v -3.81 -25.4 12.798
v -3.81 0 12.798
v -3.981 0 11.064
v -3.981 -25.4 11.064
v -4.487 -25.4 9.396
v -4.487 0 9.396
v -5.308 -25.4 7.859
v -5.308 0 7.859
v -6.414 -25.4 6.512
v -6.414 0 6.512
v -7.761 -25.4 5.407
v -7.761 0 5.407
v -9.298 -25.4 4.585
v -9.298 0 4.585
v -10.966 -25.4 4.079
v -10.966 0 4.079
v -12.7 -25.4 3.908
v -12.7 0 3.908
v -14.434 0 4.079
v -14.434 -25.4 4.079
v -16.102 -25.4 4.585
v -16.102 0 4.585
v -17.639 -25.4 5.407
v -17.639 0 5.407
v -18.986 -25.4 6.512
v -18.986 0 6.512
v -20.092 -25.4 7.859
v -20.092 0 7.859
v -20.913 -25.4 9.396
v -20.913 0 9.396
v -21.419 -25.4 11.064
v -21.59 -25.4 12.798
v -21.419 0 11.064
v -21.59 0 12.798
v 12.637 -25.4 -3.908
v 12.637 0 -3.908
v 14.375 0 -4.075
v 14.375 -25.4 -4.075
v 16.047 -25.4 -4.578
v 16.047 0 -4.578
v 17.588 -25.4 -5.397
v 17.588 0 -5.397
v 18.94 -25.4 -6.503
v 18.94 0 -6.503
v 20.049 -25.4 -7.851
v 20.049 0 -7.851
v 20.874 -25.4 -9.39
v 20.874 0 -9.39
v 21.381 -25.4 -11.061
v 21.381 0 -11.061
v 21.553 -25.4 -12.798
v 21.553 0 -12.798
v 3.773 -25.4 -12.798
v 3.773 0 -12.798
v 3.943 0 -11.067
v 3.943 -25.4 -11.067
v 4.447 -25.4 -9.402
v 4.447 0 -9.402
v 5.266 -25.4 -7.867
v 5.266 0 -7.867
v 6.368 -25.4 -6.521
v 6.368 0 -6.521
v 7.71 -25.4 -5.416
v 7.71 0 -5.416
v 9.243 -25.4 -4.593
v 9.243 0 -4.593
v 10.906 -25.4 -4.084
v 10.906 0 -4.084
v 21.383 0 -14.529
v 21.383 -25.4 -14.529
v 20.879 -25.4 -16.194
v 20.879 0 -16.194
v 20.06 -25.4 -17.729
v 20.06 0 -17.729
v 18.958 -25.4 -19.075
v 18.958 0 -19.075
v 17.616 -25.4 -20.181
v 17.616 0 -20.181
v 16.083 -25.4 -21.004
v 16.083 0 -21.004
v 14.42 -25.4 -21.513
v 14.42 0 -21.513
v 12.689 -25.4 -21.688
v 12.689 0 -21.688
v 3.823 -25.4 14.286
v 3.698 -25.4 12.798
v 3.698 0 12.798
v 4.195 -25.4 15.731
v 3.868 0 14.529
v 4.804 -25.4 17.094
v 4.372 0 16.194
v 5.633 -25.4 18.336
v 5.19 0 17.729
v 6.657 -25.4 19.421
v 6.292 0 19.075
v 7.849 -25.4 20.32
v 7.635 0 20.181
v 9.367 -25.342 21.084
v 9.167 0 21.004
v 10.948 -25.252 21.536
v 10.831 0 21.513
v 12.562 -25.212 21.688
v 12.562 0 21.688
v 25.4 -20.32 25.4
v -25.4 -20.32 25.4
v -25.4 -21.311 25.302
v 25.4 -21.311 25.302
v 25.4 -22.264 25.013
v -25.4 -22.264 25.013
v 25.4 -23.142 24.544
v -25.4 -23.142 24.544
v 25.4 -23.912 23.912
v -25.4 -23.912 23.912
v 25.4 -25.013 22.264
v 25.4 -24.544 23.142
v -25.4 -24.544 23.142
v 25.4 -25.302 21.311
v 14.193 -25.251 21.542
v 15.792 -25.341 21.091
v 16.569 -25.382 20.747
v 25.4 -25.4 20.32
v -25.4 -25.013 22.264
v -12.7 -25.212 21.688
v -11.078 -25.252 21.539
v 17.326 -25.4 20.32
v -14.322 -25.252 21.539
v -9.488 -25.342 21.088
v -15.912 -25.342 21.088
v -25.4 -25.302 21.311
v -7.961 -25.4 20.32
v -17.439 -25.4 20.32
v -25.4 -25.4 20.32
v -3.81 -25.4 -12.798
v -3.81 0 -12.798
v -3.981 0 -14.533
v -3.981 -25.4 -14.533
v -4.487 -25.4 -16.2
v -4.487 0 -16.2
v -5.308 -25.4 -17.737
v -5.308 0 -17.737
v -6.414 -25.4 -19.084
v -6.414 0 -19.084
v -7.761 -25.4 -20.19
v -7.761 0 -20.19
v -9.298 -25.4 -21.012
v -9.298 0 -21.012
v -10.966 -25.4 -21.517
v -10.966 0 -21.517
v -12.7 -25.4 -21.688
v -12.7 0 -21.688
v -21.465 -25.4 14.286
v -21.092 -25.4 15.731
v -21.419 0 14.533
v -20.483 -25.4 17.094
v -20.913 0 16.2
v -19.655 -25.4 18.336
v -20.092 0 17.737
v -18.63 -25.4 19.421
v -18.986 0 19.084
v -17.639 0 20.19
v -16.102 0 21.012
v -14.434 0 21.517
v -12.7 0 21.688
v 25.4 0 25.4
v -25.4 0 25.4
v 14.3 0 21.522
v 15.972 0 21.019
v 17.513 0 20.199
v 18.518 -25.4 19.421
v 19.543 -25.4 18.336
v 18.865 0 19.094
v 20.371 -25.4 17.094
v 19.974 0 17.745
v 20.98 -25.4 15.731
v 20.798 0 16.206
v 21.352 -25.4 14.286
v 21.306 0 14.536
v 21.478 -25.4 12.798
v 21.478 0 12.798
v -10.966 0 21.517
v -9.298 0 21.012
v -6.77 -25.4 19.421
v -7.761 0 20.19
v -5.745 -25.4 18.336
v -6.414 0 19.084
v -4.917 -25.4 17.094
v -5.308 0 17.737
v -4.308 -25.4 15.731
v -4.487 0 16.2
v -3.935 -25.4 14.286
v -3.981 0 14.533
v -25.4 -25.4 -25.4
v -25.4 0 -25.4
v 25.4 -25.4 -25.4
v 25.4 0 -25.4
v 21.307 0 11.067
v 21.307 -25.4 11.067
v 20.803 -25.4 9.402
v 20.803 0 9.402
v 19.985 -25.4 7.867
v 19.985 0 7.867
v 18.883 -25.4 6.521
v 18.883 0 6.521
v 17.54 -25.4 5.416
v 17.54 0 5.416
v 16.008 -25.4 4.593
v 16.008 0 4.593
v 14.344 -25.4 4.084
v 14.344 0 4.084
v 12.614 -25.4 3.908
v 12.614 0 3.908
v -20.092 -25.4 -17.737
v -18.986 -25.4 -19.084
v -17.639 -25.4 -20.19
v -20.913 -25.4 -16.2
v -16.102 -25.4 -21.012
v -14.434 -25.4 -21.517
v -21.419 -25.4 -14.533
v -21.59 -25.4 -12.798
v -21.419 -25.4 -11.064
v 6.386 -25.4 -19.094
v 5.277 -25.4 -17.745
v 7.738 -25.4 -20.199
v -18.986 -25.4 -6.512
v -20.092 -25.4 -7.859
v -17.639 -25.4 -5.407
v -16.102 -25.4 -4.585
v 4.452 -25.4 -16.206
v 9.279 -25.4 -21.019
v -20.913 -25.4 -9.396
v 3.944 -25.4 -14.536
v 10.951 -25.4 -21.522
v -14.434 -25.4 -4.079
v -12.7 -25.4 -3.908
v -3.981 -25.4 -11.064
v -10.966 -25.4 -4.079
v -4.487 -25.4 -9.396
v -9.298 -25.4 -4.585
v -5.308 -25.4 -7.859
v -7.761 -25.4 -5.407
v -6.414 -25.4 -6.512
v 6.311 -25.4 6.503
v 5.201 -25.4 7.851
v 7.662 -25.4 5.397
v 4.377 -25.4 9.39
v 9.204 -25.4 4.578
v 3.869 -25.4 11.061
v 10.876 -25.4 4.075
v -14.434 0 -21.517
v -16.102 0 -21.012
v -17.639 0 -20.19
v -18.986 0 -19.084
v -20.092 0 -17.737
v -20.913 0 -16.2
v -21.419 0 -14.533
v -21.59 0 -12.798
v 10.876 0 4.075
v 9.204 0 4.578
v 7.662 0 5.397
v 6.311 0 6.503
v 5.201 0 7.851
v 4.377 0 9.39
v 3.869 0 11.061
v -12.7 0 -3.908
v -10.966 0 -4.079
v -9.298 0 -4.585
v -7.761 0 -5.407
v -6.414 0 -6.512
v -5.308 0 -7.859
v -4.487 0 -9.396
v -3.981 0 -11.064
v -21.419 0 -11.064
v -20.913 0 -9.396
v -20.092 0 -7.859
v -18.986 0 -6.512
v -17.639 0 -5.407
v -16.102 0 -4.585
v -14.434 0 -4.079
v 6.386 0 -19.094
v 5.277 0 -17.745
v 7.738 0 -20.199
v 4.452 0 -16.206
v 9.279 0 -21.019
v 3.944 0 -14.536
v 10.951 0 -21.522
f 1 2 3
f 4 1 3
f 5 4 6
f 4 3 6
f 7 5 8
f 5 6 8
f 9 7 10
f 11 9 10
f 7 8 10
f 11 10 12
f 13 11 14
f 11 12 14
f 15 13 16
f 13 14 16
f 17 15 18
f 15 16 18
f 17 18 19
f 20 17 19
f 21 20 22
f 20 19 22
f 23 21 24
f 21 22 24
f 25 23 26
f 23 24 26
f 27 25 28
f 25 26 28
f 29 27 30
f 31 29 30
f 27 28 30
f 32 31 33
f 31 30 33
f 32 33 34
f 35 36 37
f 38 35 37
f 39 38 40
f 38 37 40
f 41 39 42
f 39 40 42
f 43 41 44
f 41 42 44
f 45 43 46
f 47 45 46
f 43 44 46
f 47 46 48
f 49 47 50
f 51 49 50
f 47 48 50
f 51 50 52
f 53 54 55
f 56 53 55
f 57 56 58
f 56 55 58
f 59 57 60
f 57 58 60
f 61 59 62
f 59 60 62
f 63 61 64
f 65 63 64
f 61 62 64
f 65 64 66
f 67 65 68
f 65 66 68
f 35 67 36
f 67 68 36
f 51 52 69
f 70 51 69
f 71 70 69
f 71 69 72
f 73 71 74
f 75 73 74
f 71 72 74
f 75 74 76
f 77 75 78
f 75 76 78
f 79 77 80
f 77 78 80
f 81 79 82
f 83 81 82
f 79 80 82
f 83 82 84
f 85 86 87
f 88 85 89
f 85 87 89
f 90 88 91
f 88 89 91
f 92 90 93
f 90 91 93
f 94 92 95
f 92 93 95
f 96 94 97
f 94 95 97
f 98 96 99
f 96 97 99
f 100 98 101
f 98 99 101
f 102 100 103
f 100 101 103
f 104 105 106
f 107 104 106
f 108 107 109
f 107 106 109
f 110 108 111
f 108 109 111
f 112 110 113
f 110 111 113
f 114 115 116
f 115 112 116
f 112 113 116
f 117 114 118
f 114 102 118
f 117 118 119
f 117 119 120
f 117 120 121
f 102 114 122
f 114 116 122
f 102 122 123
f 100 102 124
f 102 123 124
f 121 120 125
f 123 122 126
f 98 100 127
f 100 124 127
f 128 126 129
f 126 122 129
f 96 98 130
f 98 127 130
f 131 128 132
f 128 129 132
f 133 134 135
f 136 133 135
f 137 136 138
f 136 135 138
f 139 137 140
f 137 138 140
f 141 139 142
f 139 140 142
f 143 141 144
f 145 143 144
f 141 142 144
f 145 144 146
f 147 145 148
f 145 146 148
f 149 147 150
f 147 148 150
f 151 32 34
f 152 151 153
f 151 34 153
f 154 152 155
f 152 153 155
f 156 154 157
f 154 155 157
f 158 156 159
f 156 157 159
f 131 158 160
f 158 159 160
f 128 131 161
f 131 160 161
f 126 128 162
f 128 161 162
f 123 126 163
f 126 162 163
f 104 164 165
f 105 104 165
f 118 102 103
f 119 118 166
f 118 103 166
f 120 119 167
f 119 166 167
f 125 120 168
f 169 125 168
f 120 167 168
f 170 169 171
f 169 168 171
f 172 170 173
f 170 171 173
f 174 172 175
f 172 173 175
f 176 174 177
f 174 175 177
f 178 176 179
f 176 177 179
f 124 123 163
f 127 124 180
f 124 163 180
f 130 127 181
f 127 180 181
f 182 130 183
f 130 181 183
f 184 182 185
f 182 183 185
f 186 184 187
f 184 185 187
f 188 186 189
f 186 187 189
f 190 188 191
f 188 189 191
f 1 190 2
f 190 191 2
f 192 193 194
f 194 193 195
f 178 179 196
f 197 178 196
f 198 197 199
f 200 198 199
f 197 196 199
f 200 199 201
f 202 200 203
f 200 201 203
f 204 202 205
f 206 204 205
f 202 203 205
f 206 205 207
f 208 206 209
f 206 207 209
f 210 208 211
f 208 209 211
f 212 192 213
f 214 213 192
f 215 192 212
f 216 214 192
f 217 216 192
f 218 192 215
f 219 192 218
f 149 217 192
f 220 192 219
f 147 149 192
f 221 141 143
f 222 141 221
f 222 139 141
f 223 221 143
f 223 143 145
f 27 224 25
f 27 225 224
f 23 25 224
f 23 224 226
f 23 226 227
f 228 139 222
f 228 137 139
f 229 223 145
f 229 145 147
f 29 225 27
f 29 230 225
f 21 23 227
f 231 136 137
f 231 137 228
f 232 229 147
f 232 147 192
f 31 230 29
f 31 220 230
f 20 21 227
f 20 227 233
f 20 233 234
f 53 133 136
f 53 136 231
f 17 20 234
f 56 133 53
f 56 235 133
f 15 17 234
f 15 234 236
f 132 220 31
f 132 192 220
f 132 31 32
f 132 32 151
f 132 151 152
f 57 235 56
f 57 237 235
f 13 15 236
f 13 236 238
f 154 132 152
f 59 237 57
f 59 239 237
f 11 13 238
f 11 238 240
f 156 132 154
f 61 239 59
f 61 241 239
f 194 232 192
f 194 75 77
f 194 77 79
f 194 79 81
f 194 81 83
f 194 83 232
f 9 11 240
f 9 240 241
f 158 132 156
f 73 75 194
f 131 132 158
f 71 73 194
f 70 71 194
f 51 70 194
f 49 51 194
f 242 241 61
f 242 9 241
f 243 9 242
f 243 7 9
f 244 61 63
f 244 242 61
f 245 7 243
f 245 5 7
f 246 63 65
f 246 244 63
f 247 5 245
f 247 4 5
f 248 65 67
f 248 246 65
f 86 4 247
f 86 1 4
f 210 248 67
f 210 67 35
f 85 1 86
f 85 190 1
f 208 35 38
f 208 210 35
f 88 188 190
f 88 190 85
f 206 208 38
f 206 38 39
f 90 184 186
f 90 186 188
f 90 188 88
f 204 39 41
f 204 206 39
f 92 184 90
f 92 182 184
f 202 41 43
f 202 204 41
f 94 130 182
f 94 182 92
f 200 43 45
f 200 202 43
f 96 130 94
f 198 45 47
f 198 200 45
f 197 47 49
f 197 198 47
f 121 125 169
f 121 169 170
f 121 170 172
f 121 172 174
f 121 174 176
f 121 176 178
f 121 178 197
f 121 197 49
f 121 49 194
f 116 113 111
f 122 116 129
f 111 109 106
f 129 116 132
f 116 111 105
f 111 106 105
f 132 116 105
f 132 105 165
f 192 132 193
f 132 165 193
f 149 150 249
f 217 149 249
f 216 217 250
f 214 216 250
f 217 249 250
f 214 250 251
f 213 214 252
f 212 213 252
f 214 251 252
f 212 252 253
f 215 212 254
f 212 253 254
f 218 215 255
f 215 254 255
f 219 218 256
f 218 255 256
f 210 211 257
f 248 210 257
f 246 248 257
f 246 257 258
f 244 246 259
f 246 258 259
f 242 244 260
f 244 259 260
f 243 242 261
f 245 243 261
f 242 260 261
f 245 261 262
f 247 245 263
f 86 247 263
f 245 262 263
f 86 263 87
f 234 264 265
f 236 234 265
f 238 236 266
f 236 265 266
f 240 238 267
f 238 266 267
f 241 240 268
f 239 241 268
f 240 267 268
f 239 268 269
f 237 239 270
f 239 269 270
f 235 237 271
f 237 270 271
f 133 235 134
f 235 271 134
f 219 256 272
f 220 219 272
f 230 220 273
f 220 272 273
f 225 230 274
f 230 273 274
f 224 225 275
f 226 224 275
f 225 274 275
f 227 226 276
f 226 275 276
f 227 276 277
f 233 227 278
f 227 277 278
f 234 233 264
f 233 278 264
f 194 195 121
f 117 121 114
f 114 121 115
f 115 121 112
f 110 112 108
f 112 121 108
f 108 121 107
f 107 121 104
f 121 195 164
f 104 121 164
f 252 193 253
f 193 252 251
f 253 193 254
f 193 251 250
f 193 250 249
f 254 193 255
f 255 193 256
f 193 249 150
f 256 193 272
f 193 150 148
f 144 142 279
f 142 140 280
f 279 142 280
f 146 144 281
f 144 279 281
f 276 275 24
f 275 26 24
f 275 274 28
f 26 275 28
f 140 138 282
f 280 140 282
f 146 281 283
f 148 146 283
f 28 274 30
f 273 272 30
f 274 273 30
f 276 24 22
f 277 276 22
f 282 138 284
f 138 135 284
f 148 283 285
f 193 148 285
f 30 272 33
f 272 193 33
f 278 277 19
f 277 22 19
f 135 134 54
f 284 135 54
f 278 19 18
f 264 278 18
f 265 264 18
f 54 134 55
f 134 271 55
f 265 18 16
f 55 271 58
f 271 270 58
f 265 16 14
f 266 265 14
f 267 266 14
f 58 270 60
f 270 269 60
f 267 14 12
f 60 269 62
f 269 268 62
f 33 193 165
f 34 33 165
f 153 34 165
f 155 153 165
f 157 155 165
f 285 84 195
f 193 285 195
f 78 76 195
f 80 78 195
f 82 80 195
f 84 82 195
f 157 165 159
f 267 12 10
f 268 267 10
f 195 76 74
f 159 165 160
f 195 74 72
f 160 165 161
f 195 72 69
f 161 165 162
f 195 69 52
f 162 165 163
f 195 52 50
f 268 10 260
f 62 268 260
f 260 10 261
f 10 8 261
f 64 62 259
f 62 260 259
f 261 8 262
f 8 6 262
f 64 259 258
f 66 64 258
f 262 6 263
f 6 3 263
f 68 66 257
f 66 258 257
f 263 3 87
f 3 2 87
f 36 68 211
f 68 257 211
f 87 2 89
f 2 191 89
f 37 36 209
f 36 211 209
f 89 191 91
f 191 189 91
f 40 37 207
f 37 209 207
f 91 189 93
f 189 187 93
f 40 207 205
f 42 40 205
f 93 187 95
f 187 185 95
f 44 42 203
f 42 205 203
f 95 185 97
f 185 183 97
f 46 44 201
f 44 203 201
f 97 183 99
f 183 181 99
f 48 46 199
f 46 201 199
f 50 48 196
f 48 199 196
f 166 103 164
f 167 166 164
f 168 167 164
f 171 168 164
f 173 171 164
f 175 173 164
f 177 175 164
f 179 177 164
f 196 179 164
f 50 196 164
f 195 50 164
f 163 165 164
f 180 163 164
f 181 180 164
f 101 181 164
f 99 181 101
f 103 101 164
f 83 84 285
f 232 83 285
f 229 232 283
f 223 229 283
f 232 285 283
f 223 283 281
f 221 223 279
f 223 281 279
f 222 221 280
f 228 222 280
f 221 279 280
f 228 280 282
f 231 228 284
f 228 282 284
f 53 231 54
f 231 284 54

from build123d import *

# Parameters (mm, degrees)
F1_DEPTH    = 25.4
F2_T1_DEPTH = 76.2


# Not quite as in the source:
# - a fillet or chamfer that OpenCascade refuses, or shapes differently, is made with other operations: its cross-section is extruded or revolved along the edge and cut away or added


with BuildPart() as f1:
    # F0 (on Front) → F1 (new body)
    with BuildSketch(Plane.XZ):
        with BuildLine():
            Line((-12.7, 25.4), (-25.4, 25.4))
            Line((-25.4, 25.4), (-25.4, 12.798297219))
            Line((-25.4, 12.798297219), (-21.59, 12.798297219))
            ThreePointArc((-21.59, 12.798297219), (-18.9861792847, 19.0844765037), (-12.7, 21.688297219))
            Line((-12.7, 21.688297219), (-12.7, 25.4))
        make_face()
        with BuildLine():
            Line((0, 25.4), (-12.7, 25.4))
            Line((-12.7, 25.4), (-12.7, 21.688297219))
            ThreePointArc((-12.7, 21.688297219), (-6.4138207153, 19.0844765037), (-3.81, 12.798297219))
            Line((-3.81, 12.798297219), (0, 12.798297219))
            Line((0, 12.798297219), (0, 25.4))
        make_face()
        with BuildLine():
            Line((-21.59, 12.798297219), (-25.4, 12.798297219))
            Line((-25.4, 12.798297219), (-25.4, 0))
            Line((-25.4, 0), (-12.7, 0))
            Line((-12.7, 0), (-12.7, 3.908297219))
            ThreePointArc((-12.7, 3.908297219), (-18.9861792847, 6.5121179342), (-21.59, 12.798297219))
        make_face()
        with BuildLine():
            Line((12.5505886972, 25.4), (0, 25.4))
            Line((0, 25.4), (0, 12.798297219))
            Line((0, 12.798297219), (3.6976524143, 12.798297219))
            ThreePointArc((3.6976524143, 12.798297219), (6.2922356041, 19.0752253837), (12.5615055494, 21.6882587679))
            Line((12.5615055494, 21.6882587679), (12.5505886972, 25.4))
        make_face()
        with BuildLine():
            Line((-12.7, 0), (-25.4, 0))
            Line((-25.4, 0), (-25.4, -12.798297219))
            Line((-25.4, -12.798297219), (-21.59, -12.798297219))
            ThreePointArc((-21.59, -12.798297219), (-18.9861792847, -6.5121179342), (-12.7, -3.908297219))
            Line((-12.7, -3.908297219), (-12.7, 0))
        make_face()
        with BuildLine():
            Line((25.4, 25.4), (12.5505886972, 25.4))
            Line((12.5505886972, 25.4), (12.5615055494, 21.6882587679))
            ThreePointArc((12.5615055494, 21.6882587679), (18.8645805791, 19.0937140292), (21.4776524143, 12.798297219))
            Line((21.4776524143, 12.798297219), (25.4, 12.798297219))
            Line((25.4, 12.798297219), (25.4, 25.4))
        make_face()
        with BuildLine():
            Line((-21.59, -12.798297219), (-25.4, -12.798297219))
            Line((-25.4, -12.798297219), (-25.4, -25.4))
            Line((-25.4, -25.4), (-12.7, -25.4))
            Line((-12.7, -25.4), (-12.7, -21.688297219))
            ThreePointArc((-12.7, -21.688297219), (-18.9861792847, -19.0844765037), (-21.59, -12.798297219))
        make_face()
        with BuildLine():
            Line((25.4, 0), (25.4, 12.798297219))
            Line((25.4, 12.798297219), (21.4776524143, 12.798297219))
            ThreePointArc((21.4776524143, 12.798297219), (18.8830692245, 6.5213690542), (12.6137992792, 3.90833567))
            Line((12.6137992792, 3.90833567), (12.6252943486, 0))
            Line((12.6252943486, 0), (25.4, 0))
        make_face()
        with BuildLine():
            Line((3.7729362829, -12.798297219), (0, -12.798297219))
            Line((0, -12.798297219), (0, -25.4))
            Line((0, -25.4), (12.7, -25.4))
            Line((12.7, -25.4), (12.6890831478, -21.6882587679))
            ThreePointArc((12.6890831478, -21.6882587679), (6.3860081181, -19.0937140292), (3.7729362829, -12.798297219))
        make_face()
        with BuildLine():
            Line((0, -25.4), (0, -12.798297219))
            Line((0, -12.798297219), (-3.81, -12.798297219))
            ThreePointArc((-3.81, -12.798297219), (-6.4138207153, -19.0844765037), (-12.7, -21.688297219))
            Line((-12.7, -21.688297219), (-12.7, -25.4))
            Line((-12.7, -25.4), (0, -25.4))
        make_face()
        with BuildLine():
            Line((25.4, 0), (12.6252943486, 0))
            Line((12.6252943486, 0), (12.636789418, -3.90833567))
            ThreePointArc((12.636789418, -3.90833567), (18.9398644476, -6.5028804088), (21.5529362829, -12.798297219))
            Line((21.5529362829, -12.798297219), (25.4, -12.798297219))
            Line((25.4, -12.798297219), (25.4, 0))
        make_face()
        with BuildLine():
            Line((25.4, -25.4), (25.4, -12.798297219))
            Line((25.4, -12.798297219), (21.5529362829, -12.798297219))
            ThreePointArc((21.5529362829, -12.798297219), (18.9583530931, -19.0752253837), (12.6890831478, -21.6882587679))
            Line((12.6890831478, -21.6882587679), (12.7, -25.4))
            Line((12.7, -25.4), (25.4, -25.4))
        make_face()
        with BuildLine():
            Line((3.6976524143, 12.798297219), (0, 12.798297219))
            Line((0, 12.798297219), (0, 0))
            Line((0, 0), (12.6252943486, 0))
            Line((12.6252943486, 0), (12.6137992792, 3.90833567))
            ThreePointArc((12.6137992792, 3.90833567), (6.3107242496, 6.5028804088), (3.6976524143, 12.798297219))
        make_face()
        with BuildLine():
            Line((12.6252943486, 0), (0, 0))
            Line((0, 0), (0, -12.798297219))
            Line((0, -12.798297219), (3.7729362829, -12.798297219))
            ThreePointArc((3.7729362829, -12.798297219), (6.3675194726, -6.5213690542), (12.636789418, -3.90833567))
            Line((12.636789418, -3.90833567), (12.6252943486, 0))
        make_face()
        with BuildLine():
            Line((0, 0), (0, 12.798297219))
            Line((0, 12.798297219), (-3.81, 12.798297219))
            ThreePointArc((-3.81, 12.798297219), (-6.4138207153, 6.5121179342), (-12.7, 3.908297219))
            Line((-12.7, 3.908297219), (-12.7, 0))
            Line((-12.7, 0), (0, 0))
        make_face()
        with BuildLine():
            Line((0, 0), (-12.7, 0))
            Line((-12.7, 0), (-12.7, -3.908297219))
            ThreePointArc((-12.7, -3.908297219), (-6.4138207153, -6.5121179342), (-3.81, -12.798297219))
            Line((-3.81, -12.798297219), (0, -12.798297219))
            Line((0, -12.798297219), (0, 0))
        make_face()
    extrude(amount=F1_DEPTH)

    # F2: fillet of radius 5.08 on 1 edges, made by hand

    # F2_s2 → F2_t1 (cut)
    with BuildSketch(Plane.YZ.offset(-38.1)):
        with BuildLine():
            ThreePointArc((-20.32, 25.4), (-23.9121024484, 23.9121024484), (-25.4, 20.32))
            Line((-25.4, 20.32), (-25.4, 25.4))
            Line((-25.4, 25.4), (-20.32, 25.4))
        make_face()
    extrude(amount=F2_T1_DEPTH, mode=Mode.SUBTRACT)


solid = f1.part
